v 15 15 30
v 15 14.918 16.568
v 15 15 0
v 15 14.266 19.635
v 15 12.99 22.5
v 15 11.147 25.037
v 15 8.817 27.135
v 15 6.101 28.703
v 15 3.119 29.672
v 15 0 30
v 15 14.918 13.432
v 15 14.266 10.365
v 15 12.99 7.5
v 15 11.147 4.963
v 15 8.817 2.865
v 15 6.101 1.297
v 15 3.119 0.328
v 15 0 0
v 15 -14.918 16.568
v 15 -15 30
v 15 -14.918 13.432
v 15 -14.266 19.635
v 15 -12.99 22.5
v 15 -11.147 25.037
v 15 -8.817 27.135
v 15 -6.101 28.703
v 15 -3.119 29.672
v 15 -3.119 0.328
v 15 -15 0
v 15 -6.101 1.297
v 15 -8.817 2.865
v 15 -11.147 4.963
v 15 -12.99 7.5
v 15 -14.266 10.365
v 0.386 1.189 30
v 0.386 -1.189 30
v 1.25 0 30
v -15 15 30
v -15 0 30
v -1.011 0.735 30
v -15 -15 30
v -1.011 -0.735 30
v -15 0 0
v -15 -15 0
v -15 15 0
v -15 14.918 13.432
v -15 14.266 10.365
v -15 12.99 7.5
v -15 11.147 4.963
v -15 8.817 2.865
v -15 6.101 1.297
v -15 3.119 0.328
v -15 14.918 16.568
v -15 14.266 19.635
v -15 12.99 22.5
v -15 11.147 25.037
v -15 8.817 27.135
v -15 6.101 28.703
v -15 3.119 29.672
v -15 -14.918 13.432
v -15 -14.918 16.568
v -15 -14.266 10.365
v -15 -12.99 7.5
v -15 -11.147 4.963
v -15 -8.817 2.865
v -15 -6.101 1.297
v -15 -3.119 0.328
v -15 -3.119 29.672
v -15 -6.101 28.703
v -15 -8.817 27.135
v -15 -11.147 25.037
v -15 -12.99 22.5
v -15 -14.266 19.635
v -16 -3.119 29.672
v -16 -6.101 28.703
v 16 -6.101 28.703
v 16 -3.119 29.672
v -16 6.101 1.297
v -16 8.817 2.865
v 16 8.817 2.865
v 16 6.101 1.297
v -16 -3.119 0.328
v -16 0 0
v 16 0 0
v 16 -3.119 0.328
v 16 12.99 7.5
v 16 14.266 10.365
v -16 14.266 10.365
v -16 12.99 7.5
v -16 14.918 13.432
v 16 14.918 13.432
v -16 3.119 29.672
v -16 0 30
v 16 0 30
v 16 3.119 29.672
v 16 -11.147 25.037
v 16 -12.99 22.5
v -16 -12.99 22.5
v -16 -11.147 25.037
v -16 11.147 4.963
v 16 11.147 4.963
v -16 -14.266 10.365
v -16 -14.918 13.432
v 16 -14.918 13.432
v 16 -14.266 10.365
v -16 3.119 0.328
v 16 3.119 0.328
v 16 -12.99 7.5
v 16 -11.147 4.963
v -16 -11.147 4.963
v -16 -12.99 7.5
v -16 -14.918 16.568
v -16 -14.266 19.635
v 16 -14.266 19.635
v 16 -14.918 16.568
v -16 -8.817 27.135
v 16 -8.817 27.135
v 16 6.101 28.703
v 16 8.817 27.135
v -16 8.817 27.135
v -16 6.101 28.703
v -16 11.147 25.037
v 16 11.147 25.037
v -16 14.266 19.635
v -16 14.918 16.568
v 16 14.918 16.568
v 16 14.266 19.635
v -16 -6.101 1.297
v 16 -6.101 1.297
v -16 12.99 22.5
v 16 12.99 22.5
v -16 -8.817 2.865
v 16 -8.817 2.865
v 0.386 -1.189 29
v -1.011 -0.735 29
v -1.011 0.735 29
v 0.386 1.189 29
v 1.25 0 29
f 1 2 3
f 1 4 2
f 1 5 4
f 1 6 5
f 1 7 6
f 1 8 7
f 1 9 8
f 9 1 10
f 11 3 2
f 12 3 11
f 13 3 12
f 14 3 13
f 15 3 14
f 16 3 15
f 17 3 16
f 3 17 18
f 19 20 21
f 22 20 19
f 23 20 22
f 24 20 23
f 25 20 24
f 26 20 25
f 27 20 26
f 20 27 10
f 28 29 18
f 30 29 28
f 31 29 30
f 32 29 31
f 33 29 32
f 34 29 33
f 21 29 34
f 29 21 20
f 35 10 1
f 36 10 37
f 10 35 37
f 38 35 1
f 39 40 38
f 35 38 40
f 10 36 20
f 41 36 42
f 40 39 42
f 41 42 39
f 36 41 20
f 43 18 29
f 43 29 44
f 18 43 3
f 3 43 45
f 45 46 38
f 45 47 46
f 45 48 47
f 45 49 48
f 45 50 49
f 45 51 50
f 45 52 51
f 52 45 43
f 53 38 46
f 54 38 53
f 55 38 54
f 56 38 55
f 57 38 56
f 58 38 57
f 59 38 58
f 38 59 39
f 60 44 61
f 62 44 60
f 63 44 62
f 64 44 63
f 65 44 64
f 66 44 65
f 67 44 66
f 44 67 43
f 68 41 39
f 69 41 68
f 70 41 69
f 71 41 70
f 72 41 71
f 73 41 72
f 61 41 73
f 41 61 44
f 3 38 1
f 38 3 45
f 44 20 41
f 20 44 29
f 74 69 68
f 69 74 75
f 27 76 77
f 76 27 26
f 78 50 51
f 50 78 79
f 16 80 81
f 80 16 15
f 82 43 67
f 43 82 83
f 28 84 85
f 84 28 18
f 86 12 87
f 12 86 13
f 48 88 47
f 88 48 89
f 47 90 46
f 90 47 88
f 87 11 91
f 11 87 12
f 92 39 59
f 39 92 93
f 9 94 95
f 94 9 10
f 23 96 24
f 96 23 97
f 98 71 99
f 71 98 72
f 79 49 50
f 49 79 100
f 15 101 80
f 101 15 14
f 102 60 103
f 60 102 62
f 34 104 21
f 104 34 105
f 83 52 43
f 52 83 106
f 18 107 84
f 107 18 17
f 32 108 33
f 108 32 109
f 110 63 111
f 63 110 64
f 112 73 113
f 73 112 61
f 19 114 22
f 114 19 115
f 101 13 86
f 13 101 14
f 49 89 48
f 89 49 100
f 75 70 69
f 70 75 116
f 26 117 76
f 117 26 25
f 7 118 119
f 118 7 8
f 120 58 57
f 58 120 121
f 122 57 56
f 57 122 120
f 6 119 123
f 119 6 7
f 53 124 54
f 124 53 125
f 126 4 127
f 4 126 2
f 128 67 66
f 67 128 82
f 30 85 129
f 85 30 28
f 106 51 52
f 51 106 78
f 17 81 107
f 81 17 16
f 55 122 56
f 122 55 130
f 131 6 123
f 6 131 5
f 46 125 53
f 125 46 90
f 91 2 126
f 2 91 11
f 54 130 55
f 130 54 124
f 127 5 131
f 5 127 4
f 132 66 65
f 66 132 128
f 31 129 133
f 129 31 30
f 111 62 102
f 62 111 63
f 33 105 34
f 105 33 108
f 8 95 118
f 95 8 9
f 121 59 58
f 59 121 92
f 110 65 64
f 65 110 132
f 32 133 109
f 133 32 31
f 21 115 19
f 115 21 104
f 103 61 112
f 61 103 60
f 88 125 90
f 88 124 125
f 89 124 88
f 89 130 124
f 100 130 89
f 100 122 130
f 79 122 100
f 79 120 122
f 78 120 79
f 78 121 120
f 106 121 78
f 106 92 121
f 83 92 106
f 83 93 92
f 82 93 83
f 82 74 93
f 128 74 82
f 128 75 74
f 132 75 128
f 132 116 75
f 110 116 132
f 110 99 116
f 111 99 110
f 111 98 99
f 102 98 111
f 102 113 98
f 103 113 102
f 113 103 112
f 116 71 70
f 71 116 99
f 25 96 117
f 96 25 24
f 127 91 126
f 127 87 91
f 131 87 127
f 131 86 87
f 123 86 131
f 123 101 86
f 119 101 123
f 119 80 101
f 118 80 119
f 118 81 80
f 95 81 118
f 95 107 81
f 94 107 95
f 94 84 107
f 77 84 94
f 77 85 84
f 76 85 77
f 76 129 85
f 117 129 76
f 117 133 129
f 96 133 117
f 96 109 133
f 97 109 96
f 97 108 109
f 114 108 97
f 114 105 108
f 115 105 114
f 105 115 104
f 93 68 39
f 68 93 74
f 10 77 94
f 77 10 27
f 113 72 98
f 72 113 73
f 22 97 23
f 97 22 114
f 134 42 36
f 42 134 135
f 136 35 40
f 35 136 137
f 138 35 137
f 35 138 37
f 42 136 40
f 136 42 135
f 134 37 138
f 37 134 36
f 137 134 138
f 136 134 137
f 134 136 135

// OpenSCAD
taille_du_cube = 30; // [10:Small,20:Medium,30:Large]

diametre_du_trou = 2.5; 


// How deep should the center hole be?
hole_depth = 1; // [0,1,5,50]

show_wheels = "yes"; // [yes,no]

// How thick should the side wheels be?
wheel_thickness = 1; // [1:40]

// ignore this variable!
// foo=1;

// don't turn functions into params!
function BEZ03(u) = pow((1-u), 3);

// ignore variable values
bing = 3+4;
baz = 3 / hole_depth;
cube_size = taille_du_cube; 
hole_diameter = diametre_du_trou; 
hole_radius = hole_diameter/2;


difference() {
  union() {
    translate([0, 0, cube_size/2]) cube([cube_size,cube_size,cube_size], center=true);
    if (show_wheels == "yes") {
      translate([0, 0, cube_size/2]) rotate([0, 90, 0]) {
        cylinder(r=cube_size/2, h=cube_size+(wheel_thickness*2), center=true);
      }
    }
  }
  translate([0, 0, cube_size-hole_depth]) cylinder(r=hole_radius, h=hole_depth);
}
        
